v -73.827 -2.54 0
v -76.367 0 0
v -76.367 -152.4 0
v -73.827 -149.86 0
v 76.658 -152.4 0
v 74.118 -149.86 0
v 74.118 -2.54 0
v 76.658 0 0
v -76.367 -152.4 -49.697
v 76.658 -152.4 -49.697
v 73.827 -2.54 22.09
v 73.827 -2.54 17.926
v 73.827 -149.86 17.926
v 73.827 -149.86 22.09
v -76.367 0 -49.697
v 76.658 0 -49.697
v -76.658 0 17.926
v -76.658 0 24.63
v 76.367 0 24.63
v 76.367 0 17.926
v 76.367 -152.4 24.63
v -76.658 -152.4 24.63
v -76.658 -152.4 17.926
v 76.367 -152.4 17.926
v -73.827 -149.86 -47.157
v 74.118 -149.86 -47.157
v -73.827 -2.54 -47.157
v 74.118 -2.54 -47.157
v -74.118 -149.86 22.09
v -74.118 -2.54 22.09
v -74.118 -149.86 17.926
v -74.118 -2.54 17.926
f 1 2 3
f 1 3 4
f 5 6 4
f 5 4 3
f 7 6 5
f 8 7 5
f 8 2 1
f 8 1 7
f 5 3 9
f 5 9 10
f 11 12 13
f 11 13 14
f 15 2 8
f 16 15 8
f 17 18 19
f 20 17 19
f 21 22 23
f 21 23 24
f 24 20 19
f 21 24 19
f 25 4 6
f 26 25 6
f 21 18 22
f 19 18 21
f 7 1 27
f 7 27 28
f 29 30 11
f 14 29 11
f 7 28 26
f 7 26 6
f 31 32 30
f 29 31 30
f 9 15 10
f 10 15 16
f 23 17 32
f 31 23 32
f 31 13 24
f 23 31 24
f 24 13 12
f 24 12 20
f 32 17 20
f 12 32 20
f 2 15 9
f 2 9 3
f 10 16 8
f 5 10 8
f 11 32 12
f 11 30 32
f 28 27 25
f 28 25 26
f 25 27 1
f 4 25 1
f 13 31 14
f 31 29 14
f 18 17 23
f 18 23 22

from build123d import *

# Parameters (mm, degrees)
F0_W     = 153.0245915055
F0_H     = 6.7039355636
F1_DEPTH = 152.4
F0_H_2   = 49.6965572238
F2_T     = -2.54
F3_T     = -2.54


with BuildPart() as f1:
    # F0 (on Front) → F1 (new body)
    with BuildSketch(Plane.XZ):
        with Locations((-0.1457370818, 21.2777052075)):
            Rectangle(F0_W, F0_H)
    extrude(amount=F1_DEPTH)

    # F2
    f2_openings = [f1.faces().sort_by_distance(p)[0] for p in [
        (-0.145737, -76.2, 17.925737),
    ]]
    offset(amount=F2_T, openings=f2_openings)


with BuildPart() as f1b:
    # F0 (on Front) → F1, piece 2 (new body)
    with BuildSketch(Plane.XZ):
        with Locations((0.1457370818, -24.8482786119)):
            Rectangle(F0_W, F0_H_2)
    extrude(amount=F1_DEPTH)

    # F3
    f3_openings = [f1b.faces().sort_by_distance(p)[0] for p in [
        (0.145737, -76.2, 0),
    ]]
    offset(amount=F3_T, openings=f3_openings)


solid = Compound([f1.part, f1b.part])
